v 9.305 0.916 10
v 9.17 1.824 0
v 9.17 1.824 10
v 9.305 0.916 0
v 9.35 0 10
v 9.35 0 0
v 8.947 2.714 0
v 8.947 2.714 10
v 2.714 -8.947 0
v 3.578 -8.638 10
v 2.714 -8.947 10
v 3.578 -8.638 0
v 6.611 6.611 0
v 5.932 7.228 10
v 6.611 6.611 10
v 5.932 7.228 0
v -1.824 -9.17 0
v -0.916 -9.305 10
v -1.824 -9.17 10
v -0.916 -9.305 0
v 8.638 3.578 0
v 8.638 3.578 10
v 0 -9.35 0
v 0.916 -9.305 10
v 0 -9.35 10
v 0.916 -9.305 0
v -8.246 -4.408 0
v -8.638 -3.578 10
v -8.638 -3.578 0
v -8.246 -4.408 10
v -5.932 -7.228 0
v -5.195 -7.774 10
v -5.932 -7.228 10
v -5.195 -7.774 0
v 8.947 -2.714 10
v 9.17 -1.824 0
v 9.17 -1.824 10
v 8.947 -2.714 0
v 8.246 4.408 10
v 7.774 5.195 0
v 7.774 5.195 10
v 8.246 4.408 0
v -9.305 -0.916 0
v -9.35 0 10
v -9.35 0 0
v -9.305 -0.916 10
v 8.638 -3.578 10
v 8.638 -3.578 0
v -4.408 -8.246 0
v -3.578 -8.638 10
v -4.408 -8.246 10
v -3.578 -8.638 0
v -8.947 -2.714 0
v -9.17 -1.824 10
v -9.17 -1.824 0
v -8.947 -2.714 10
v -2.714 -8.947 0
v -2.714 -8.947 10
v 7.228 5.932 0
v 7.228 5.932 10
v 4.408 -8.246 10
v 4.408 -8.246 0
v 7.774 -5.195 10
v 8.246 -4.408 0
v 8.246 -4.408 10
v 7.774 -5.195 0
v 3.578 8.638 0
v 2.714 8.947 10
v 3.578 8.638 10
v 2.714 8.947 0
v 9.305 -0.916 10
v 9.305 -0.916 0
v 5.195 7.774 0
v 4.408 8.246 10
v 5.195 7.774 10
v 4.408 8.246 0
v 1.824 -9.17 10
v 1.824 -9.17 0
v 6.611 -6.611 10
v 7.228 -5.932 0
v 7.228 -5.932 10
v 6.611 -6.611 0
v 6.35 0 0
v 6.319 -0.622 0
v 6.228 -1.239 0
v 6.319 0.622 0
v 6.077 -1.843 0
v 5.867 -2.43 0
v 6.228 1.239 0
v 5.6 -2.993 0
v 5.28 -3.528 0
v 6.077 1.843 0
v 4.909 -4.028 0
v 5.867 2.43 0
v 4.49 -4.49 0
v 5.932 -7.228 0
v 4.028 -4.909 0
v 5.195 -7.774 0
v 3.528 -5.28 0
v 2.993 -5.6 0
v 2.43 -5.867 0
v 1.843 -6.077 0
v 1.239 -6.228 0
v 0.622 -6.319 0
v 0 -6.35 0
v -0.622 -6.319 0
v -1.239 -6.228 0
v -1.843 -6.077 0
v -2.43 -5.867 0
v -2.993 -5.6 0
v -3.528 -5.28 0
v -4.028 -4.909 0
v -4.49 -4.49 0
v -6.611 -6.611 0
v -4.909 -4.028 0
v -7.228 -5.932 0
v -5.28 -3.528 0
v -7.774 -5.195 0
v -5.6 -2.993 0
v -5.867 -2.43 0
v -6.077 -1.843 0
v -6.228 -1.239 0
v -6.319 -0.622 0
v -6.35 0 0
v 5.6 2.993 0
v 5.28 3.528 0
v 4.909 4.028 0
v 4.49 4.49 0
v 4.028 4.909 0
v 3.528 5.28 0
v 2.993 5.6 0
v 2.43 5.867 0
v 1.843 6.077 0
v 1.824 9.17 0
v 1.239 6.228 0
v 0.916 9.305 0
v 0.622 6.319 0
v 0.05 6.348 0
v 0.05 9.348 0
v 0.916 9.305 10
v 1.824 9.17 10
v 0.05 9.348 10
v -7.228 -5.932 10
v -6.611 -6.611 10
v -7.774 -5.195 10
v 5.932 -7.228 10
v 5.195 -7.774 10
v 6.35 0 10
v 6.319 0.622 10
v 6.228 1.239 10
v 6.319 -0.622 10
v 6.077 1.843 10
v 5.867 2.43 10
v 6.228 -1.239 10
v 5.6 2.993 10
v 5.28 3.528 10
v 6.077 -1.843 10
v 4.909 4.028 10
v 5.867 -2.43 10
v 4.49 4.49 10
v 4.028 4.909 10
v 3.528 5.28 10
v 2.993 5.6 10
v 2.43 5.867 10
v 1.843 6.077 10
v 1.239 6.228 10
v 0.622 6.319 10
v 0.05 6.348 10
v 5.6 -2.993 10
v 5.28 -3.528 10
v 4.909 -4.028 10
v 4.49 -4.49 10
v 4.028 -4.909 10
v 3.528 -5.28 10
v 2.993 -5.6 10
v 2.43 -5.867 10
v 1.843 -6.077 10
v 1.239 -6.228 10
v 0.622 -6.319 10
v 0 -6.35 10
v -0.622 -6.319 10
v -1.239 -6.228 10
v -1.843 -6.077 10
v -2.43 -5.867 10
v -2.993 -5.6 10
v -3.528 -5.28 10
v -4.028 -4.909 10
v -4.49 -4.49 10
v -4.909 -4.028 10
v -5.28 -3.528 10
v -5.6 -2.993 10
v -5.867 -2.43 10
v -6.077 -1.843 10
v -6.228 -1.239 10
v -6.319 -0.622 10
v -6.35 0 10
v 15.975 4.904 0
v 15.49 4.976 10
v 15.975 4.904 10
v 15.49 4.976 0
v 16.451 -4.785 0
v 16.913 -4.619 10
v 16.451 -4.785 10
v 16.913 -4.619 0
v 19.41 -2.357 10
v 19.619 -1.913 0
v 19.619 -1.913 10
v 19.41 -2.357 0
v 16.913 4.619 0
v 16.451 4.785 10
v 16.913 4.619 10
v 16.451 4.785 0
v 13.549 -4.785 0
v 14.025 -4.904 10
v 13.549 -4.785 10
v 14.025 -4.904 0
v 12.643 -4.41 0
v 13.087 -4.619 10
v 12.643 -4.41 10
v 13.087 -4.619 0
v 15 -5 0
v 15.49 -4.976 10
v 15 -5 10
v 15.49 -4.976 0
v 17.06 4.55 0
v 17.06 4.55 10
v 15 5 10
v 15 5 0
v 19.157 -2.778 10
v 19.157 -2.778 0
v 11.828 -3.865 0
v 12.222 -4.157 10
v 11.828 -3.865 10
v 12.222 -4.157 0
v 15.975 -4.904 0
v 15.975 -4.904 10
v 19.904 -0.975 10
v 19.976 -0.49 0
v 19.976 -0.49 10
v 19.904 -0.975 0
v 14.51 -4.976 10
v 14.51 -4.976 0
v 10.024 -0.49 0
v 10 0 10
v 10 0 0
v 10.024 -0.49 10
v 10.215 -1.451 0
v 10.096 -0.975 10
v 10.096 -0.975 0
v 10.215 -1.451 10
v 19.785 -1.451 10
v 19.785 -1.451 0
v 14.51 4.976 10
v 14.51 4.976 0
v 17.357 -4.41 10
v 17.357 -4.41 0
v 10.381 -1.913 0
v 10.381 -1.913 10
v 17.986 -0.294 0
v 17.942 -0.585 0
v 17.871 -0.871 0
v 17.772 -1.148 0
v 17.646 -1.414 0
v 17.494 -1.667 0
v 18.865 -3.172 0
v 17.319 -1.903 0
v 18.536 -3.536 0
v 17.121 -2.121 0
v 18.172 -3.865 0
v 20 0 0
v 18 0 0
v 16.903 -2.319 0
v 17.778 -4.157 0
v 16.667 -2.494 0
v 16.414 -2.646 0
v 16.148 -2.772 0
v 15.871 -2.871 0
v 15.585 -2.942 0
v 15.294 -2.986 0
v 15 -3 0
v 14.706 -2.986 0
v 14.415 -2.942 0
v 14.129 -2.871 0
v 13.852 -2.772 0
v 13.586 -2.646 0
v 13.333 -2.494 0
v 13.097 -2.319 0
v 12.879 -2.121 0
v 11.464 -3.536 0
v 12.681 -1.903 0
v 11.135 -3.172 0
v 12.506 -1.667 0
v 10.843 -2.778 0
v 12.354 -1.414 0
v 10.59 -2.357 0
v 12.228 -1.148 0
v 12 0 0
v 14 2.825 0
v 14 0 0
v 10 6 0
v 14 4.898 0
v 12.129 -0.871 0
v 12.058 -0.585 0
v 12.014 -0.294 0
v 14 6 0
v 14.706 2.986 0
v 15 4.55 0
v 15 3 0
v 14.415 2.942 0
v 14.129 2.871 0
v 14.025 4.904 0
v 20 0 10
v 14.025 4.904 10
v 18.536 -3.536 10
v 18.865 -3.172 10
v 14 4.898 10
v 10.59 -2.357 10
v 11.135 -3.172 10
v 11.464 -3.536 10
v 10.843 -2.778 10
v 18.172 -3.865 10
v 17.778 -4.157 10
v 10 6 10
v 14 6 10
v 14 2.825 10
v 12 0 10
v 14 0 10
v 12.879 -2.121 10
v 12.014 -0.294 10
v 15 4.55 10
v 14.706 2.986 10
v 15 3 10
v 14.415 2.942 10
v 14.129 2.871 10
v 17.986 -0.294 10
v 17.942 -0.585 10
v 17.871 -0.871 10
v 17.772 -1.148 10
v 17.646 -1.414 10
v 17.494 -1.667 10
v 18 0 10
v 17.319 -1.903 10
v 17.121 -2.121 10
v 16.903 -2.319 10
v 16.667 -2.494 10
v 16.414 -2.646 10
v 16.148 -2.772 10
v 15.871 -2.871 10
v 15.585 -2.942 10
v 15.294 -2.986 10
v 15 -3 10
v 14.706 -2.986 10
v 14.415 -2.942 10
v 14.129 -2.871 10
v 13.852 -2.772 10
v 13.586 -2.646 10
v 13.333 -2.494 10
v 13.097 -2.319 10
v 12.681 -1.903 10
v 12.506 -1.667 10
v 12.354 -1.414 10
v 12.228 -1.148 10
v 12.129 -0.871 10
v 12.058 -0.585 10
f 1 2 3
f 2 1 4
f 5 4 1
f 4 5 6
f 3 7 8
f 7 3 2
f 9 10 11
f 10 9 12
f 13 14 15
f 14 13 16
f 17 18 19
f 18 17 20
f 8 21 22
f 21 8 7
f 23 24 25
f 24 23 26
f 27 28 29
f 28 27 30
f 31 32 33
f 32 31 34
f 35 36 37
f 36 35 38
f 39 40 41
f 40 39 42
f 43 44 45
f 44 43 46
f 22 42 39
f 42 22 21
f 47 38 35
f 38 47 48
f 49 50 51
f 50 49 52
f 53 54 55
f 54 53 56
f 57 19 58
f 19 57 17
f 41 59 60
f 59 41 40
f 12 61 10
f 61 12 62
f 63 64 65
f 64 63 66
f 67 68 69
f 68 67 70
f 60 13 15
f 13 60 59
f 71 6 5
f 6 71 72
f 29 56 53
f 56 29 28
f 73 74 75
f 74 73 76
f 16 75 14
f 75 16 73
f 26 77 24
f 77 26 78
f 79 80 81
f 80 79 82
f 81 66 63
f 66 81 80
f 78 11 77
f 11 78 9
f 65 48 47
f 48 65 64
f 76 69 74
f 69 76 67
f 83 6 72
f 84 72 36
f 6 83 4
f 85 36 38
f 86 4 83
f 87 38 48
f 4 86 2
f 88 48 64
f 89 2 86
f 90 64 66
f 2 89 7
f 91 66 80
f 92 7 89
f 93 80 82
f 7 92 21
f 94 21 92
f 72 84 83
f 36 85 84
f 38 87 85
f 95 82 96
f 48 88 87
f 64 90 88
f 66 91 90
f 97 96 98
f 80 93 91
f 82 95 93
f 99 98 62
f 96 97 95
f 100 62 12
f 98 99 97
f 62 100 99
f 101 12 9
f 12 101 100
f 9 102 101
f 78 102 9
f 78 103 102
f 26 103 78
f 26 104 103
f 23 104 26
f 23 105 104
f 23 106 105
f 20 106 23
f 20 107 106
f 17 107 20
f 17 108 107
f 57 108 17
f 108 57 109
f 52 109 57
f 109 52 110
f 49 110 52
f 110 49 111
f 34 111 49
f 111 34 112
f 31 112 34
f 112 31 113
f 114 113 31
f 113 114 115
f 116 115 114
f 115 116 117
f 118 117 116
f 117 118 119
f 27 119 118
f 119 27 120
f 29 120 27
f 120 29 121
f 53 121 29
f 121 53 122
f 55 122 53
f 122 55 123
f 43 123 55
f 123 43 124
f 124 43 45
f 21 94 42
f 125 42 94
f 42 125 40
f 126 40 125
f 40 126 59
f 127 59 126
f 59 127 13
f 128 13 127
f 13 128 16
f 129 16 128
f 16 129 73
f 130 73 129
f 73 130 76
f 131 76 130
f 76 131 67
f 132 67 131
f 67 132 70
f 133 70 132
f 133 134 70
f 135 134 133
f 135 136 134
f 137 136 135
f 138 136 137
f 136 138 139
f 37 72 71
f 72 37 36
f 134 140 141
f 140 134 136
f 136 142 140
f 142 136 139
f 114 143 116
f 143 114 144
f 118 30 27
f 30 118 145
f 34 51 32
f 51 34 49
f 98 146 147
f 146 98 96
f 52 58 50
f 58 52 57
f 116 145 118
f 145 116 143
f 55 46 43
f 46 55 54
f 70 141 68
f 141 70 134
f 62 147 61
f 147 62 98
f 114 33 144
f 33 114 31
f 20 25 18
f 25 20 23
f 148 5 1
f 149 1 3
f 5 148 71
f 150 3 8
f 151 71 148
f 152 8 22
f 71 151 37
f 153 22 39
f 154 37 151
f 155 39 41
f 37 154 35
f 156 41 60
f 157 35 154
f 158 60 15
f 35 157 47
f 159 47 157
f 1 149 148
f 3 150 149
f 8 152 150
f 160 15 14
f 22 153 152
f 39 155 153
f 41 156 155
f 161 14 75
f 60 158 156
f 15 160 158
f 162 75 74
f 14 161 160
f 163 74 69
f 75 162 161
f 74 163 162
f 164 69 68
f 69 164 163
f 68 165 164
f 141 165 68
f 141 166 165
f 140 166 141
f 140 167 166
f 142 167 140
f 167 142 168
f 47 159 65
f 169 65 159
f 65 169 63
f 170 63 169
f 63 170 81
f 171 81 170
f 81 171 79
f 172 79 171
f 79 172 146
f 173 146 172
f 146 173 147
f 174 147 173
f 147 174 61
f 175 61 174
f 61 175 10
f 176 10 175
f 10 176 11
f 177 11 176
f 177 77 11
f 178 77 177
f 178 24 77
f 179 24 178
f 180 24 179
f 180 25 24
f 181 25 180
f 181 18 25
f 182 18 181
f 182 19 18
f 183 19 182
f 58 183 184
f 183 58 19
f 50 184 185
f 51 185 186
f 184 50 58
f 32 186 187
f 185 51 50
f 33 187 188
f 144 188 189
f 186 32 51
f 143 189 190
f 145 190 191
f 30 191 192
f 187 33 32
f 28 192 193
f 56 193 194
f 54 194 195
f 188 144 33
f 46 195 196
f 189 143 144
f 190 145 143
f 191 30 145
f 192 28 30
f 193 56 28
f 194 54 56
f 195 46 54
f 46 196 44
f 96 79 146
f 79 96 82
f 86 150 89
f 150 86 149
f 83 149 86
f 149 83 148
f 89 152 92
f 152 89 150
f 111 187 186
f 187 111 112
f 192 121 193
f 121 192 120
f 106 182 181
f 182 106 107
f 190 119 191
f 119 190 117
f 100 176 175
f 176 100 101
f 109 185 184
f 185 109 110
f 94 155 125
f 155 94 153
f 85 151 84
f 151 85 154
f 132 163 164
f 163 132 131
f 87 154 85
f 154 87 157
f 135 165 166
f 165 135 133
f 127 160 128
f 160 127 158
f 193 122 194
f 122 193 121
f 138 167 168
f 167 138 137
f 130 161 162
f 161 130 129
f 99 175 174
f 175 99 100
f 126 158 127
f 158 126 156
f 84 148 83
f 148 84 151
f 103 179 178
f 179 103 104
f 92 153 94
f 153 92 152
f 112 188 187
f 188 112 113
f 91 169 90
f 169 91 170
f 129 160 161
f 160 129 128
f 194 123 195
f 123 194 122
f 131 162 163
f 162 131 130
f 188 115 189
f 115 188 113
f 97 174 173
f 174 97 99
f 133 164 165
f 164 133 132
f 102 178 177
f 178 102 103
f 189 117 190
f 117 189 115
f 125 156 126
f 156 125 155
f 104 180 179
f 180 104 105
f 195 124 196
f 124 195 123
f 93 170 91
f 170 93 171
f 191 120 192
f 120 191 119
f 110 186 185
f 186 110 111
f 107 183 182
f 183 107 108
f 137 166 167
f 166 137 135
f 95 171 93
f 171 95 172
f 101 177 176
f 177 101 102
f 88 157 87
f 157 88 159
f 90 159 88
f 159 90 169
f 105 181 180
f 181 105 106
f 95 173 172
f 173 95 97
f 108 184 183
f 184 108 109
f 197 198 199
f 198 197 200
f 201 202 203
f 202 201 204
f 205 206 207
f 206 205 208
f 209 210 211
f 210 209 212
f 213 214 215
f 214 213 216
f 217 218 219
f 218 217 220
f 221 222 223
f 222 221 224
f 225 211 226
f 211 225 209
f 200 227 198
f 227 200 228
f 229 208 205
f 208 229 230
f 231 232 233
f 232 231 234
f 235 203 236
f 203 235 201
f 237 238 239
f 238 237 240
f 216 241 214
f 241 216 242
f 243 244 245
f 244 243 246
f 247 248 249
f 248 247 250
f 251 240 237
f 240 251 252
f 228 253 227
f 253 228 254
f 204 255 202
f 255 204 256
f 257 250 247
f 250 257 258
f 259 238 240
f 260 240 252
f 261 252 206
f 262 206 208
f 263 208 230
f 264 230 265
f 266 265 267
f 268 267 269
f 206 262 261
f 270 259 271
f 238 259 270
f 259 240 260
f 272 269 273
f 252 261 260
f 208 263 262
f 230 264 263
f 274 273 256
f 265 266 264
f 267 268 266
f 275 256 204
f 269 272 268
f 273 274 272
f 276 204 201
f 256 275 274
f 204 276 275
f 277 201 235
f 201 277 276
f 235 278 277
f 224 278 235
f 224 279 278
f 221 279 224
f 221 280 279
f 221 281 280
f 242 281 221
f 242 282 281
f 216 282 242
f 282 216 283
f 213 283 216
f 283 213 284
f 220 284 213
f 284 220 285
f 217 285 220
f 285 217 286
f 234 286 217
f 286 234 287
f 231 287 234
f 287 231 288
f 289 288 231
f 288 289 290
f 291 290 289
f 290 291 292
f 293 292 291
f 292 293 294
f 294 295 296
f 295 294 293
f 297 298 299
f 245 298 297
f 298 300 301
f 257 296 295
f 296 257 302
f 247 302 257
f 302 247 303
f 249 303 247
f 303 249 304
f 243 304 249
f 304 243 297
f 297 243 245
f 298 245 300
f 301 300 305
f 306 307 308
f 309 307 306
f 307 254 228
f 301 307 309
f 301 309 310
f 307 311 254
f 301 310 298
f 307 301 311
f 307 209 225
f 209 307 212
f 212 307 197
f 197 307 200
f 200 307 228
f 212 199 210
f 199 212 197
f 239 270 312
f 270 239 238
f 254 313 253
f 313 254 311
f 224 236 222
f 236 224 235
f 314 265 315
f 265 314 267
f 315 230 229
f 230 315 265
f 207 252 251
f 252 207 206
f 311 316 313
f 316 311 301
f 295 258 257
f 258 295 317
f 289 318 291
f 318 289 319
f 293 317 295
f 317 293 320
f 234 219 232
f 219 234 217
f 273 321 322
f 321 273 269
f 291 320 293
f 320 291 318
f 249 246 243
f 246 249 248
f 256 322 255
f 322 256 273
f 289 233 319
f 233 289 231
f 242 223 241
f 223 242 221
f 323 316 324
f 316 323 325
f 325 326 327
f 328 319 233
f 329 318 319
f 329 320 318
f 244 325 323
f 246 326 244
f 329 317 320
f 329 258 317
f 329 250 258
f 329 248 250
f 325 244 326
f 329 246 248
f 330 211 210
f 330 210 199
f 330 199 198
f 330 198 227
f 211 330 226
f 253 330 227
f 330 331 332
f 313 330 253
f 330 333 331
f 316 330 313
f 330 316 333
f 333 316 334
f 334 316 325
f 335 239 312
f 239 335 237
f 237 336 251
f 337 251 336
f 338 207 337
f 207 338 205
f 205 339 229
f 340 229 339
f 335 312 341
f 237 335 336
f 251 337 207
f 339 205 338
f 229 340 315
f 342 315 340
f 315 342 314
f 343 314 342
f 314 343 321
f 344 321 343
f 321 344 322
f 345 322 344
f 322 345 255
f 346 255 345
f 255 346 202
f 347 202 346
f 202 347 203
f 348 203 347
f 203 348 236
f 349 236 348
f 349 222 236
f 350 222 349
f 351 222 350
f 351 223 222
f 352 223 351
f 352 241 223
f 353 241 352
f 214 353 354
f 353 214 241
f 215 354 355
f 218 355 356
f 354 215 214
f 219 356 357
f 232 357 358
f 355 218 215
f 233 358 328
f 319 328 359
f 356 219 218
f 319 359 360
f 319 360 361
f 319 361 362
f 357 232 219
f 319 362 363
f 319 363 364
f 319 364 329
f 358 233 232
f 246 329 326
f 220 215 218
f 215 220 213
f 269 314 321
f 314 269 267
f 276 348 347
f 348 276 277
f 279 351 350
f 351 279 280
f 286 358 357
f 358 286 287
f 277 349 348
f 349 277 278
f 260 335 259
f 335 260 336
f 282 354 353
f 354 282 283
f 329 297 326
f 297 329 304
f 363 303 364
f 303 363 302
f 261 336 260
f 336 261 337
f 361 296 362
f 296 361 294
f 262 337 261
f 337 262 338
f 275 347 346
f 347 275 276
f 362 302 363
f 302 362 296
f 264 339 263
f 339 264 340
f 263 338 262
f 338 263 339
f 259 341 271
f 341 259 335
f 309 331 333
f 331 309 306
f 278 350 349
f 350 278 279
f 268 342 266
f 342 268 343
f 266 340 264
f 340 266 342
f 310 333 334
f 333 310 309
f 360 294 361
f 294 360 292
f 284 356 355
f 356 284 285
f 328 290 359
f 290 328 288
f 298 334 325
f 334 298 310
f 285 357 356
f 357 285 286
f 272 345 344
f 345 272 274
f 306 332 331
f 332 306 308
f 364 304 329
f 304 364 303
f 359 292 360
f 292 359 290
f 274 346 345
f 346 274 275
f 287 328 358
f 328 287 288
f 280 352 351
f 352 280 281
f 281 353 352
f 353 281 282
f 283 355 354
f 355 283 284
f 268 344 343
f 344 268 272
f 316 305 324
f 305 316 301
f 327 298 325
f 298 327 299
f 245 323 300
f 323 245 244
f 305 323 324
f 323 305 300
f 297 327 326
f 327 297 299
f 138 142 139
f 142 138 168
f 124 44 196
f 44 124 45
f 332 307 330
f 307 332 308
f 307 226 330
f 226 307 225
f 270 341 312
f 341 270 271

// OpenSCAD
// Snap-on Clip for Lab Stand Rod and Tubing
// Units: Millimetres
// Orientation: Flat on XY plane, builds upward (+Z), centred on origin

$fn = 64;

// --- Dimensions ---
Z_HEIGHT = 10;
ROD_ID = 12.7;
ROD_WALL = 3;
ROD_OD = 18.7;
ROD_CENTER_X = 0;
ROD_CENTER_Y = 0;
ROD_CUT_Y_LIMIT = 5;
ROD_CUT_X_LIMIT = 0; // Cut is x < 0

TUBING_ID = 6;
TUBING_WALL = 2;
TUBING_OD = 10;
TUBING_CENTER_X = 15;
TUBING_CENTER_Y = 0;
TUBING_CUT_Y_LIMIT = 2.25;
TUBING_CUT_X_LIMIT = 15; // Cut is x > 15

BRIDGE_WIDTH_Y = 6;
BRIDGE_X_START = 8;
BRIDGE_X_END = 12;

// --- Derived Dimensions ---
ROD_RADIUS_OUT = ROD_OD / 2;
ROD_RADIUS_IN = ROD_ID / 2;
TUBING_RADIUS_OUT = TUBING_OD / 2;
TUBING_RADIUS_IN = TUBING_ID / 2;
BRIDGE_X_WIDTH = BRIDGE_X_END - BRIDGE_X_START;
BRIDGE_X_CENTER = (BRIDGE_X_START + BRIDGE_X_END) / 2;
BRIDGE_Y_HALF = BRIDGE_WIDTH_Y / 2;

// --- Cut Tolerances ---
CUT_Z_TOL = 0.05;
CUT_X_TOL = 0.05;
CUT_Y_TOL = 0.05;

// --- Module: Rod Ring ---
module rod_ring() {
    translate([ROD_CENTER_X, ROD_CENTER_Y, 0])
    difference() {
        cylinder(h = Z_HEIGHT, r = ROD_RADIUS_OUT, $fn = 64);
        cylinder(h = Z_HEIGHT, r = ROD_RADIUS_IN, $fn = 64);
    }
}

// --- Module: Tubing Ring ---
module tubing_ring() {
    translate([TUBING_CENTER_X, TUBING_CENTER_Y, 0])
    difference() {
        cylinder(h = Z_HEIGHT, r = TUBING_RADIUS_OUT, $fn = 64);
        cylinder(h = Z_HEIGHT, r = TUBING_RADIUS_IN, $fn = 64);
    }
}

// --- Module: Bridge ---
module bridge() {
    translate([BRIDGE_X_CENTER, 0, 0])
    cube([BRIDGE_X_WIDTH, BRIDGE_WIDTH_Y, Z_HEIGHT]);
}

// --- Module: Rod Cut ---
module rod_cut() {
    // Cut x < 0, -5 < y < 5
    // Extend past faces: x_max = 0.05, y_max = 5.05, z_max = 10.05
    translate([-ROD_RADIUS_OUT, 0, 0])
    cube([ROD_RADIUS_OUT + CUT_X_TOL, ROD_CUT_Y_LIMIT * 2 + CUT_Y_TOL, Z_HEIGHT + CUT_Z_TOL]);
}

// --- Module: Tubing Cut ---
module tubing_cut() {
    // Cut x > 15, -2.25 < y < 2.25
    // Extend past faces: x_min = 15.05, y_max = 2.25 + 0.05, z_max = 10.05
    translate([TUBING_CENTER_X, 0, 0])
    cube([TUBING_RADIUS_OUT + CUT_X_TOL, TUBING_CUT_Y_LIMIT * 2 + CUT_Y_TOL, Z_HEIGHT + CUT_Z_TOL]);
}

// --- Main Assembly ---
difference() {
    union() {
        rod_ring();
        tubing_ring();
        bridge();
    };
    
    rod_cut();
    tubing_cut();
}
